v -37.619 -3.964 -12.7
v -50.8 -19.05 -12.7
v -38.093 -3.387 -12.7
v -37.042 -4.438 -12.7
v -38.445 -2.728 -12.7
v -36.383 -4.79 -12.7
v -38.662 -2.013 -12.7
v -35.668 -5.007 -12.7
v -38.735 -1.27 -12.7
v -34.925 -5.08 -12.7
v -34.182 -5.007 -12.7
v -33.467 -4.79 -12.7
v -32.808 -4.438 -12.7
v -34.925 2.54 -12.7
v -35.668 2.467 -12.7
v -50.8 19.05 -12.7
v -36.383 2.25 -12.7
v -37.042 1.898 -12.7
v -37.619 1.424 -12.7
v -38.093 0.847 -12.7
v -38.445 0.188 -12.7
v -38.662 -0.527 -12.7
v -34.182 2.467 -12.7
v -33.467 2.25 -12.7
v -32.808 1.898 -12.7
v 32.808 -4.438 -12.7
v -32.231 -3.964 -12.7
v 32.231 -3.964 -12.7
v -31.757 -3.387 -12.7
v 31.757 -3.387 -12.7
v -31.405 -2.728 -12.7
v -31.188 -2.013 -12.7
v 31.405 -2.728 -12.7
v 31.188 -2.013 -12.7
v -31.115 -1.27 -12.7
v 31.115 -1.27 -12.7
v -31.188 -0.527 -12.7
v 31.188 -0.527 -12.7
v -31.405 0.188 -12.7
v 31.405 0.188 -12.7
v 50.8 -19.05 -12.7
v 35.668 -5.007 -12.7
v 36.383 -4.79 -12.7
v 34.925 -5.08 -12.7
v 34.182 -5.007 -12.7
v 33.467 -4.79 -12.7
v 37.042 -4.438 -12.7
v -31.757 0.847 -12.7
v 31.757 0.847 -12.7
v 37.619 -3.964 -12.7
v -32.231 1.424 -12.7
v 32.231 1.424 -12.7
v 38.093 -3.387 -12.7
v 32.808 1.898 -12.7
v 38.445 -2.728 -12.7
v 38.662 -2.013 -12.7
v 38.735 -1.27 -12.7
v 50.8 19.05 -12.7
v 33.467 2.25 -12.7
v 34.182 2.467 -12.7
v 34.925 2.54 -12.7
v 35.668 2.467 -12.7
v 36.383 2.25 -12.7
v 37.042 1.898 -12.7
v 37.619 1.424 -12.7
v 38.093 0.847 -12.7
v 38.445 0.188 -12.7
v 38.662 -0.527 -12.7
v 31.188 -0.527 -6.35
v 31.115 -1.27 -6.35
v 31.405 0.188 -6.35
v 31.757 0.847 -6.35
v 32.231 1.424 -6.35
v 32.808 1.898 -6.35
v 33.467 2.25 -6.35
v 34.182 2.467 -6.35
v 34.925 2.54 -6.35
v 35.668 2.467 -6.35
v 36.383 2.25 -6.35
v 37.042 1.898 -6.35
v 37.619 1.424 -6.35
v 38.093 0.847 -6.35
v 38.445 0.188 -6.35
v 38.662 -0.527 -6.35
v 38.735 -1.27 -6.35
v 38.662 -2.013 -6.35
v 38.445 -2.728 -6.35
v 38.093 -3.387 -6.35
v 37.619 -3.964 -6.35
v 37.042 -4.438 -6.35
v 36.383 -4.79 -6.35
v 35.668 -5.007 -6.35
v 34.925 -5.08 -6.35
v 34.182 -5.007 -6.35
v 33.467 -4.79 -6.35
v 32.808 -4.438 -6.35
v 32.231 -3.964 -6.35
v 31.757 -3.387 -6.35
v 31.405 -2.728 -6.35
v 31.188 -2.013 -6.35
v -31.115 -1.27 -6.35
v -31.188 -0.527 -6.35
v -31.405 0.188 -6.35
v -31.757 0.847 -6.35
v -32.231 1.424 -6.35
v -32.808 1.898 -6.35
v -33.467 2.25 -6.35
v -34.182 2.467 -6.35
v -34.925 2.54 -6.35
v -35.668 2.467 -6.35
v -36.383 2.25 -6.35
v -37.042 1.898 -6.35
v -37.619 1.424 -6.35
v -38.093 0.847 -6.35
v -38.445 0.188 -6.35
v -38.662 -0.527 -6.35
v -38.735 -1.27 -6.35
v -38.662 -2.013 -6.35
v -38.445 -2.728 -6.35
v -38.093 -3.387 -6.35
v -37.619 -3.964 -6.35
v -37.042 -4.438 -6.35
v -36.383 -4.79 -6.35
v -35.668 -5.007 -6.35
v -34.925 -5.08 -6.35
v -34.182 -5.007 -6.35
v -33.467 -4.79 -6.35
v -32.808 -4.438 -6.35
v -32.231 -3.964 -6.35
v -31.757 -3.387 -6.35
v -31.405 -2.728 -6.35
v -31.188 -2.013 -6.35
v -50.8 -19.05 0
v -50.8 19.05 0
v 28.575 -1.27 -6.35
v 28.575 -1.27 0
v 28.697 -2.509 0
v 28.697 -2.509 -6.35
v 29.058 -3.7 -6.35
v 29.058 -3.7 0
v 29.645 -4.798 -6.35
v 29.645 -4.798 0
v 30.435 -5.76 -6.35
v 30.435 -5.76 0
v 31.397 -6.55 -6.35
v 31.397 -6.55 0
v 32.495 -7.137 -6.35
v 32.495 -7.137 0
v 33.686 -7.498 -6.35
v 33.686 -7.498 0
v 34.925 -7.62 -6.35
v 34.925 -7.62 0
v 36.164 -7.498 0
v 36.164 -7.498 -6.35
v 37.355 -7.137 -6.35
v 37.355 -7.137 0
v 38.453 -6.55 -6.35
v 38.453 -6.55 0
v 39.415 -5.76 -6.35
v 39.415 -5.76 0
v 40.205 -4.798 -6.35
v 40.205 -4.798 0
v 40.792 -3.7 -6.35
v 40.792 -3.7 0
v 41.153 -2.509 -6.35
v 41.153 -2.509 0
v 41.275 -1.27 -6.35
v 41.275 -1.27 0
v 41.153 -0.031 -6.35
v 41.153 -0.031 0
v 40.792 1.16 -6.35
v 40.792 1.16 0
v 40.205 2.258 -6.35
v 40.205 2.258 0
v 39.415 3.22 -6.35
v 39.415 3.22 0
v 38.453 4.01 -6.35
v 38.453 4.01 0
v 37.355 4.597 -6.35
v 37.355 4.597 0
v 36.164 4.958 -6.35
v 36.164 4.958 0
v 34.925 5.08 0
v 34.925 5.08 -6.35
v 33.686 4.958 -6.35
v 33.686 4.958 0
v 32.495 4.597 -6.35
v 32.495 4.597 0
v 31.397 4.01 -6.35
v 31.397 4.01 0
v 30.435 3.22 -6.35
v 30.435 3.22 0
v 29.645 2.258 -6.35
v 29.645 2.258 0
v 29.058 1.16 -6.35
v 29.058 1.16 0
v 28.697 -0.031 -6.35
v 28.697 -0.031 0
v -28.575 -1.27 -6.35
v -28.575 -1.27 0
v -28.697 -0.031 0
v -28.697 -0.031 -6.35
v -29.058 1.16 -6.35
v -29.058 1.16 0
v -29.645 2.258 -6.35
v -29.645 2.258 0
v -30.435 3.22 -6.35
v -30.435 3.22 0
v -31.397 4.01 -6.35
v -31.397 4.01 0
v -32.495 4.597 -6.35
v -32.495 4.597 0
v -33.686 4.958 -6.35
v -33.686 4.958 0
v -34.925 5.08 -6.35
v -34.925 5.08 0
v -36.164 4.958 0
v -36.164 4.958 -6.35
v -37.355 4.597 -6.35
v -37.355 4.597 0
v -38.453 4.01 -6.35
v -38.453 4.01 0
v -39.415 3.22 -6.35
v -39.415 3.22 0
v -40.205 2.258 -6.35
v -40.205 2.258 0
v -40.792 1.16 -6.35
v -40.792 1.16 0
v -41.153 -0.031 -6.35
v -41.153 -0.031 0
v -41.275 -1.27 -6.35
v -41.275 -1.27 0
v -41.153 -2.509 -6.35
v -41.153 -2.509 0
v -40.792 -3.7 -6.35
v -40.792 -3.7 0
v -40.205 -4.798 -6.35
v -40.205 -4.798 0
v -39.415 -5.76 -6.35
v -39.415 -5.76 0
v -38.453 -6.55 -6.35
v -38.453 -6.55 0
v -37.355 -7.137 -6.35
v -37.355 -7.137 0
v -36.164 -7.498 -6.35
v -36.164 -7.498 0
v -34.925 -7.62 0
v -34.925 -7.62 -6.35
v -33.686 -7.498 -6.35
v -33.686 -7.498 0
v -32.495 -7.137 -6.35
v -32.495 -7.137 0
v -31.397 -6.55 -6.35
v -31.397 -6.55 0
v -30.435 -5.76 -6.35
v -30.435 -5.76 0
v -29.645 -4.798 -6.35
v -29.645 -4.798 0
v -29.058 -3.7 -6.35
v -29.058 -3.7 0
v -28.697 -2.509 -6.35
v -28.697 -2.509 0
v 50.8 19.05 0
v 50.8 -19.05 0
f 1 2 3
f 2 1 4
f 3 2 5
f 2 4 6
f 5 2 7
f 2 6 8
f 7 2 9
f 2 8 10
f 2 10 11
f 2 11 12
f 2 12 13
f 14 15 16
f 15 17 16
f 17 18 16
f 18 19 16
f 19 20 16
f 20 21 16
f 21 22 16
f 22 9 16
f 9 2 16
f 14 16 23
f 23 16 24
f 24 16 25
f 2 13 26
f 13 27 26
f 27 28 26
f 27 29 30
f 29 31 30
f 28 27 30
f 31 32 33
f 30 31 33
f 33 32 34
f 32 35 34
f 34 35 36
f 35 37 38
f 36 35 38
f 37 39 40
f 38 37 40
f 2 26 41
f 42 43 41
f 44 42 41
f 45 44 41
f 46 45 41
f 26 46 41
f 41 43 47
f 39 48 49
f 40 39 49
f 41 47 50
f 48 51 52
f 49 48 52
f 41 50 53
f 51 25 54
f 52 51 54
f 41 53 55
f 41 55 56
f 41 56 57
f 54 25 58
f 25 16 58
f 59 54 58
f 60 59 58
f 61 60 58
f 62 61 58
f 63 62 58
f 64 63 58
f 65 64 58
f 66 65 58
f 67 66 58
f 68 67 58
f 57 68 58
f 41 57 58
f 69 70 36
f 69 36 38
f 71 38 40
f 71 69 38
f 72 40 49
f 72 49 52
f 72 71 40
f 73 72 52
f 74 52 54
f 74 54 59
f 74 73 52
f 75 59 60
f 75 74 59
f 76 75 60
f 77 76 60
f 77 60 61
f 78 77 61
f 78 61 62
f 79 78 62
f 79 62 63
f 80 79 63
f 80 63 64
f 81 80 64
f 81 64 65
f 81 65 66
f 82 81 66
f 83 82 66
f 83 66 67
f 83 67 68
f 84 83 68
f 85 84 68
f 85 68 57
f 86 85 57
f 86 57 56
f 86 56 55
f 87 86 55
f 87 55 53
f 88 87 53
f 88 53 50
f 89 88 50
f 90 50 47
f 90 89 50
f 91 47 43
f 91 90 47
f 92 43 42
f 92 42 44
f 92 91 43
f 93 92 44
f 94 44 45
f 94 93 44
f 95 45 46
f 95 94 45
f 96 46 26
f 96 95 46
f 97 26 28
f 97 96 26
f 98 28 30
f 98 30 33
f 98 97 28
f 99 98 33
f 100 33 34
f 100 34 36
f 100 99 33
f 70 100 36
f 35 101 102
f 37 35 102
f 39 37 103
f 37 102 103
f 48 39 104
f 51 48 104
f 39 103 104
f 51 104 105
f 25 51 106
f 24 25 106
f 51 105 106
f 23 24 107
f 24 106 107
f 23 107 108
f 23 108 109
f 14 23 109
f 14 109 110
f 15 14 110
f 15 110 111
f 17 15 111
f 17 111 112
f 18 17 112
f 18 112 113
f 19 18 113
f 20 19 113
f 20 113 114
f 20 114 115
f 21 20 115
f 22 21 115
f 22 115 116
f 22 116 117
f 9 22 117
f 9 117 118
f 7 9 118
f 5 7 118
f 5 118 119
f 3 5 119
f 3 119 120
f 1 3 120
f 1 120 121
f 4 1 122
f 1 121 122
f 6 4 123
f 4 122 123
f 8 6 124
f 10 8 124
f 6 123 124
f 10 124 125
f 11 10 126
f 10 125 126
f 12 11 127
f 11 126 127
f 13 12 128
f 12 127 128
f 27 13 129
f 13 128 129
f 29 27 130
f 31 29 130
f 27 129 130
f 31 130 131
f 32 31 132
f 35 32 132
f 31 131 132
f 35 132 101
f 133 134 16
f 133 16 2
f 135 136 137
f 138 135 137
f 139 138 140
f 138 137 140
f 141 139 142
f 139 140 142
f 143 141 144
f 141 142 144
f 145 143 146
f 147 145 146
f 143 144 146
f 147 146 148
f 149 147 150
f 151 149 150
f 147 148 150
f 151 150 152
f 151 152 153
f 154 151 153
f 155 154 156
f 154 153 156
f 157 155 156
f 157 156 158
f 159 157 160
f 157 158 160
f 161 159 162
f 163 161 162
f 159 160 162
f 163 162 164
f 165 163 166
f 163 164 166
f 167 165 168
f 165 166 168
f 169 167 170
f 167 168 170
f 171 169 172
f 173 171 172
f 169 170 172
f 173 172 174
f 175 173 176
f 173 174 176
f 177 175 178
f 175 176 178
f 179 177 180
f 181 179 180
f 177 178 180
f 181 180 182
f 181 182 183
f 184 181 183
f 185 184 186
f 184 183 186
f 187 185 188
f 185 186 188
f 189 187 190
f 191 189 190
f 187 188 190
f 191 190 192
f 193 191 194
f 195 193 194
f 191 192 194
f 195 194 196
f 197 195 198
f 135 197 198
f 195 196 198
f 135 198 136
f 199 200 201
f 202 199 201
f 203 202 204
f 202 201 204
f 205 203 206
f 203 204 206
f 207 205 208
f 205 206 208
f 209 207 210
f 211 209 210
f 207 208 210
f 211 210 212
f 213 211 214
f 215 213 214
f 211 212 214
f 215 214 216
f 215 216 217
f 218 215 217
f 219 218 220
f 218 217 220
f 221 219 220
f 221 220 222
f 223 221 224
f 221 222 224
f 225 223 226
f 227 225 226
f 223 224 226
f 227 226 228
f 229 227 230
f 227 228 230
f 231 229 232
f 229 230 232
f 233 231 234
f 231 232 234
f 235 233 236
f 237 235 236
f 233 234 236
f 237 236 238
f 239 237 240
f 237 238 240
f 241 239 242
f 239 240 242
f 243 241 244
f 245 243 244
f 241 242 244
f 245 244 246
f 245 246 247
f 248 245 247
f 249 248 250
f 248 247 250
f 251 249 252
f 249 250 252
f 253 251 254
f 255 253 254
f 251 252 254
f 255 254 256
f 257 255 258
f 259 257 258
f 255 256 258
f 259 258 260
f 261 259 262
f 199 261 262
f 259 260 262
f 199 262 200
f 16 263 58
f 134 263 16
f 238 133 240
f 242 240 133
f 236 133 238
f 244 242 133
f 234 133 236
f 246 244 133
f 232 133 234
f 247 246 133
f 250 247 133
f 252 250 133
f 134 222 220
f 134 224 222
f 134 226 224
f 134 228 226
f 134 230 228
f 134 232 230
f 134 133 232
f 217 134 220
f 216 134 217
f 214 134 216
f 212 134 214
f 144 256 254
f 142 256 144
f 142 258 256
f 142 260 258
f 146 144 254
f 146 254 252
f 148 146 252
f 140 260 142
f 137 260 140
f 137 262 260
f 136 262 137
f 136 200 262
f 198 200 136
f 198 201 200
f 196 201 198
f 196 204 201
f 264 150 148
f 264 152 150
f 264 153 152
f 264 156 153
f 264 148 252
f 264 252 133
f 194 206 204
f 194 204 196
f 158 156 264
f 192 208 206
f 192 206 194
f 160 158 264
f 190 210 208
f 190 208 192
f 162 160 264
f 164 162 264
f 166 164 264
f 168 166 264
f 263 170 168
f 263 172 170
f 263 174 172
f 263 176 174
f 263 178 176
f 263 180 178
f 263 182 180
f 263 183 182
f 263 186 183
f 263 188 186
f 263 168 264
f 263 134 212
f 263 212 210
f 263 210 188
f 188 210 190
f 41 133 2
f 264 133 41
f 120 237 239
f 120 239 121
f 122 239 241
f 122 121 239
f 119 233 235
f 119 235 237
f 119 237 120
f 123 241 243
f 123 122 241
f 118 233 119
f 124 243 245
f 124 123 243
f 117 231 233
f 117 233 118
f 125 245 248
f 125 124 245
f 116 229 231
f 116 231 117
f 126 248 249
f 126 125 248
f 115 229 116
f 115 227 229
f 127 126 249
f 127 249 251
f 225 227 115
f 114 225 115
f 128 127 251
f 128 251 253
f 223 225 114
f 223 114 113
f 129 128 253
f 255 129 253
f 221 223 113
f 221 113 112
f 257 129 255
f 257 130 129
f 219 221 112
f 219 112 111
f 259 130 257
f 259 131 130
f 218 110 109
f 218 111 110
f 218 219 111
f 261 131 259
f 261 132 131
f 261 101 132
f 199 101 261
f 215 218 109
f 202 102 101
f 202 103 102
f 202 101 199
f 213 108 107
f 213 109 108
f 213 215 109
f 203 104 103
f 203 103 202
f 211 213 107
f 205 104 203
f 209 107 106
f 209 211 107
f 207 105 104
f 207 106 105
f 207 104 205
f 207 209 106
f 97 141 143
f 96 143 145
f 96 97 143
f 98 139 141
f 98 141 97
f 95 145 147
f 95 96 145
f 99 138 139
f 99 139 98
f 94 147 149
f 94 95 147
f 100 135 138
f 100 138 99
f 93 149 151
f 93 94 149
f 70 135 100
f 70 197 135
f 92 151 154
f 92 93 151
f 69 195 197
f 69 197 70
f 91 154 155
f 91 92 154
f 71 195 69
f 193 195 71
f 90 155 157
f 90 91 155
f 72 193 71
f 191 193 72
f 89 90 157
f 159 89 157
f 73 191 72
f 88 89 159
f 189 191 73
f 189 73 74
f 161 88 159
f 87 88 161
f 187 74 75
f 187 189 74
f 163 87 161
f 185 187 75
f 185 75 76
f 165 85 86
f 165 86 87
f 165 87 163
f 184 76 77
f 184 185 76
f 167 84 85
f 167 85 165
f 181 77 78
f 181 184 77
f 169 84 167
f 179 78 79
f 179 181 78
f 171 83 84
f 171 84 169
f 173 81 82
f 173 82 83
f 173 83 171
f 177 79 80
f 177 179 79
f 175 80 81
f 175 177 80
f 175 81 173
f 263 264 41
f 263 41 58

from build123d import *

# Parameters (mm, degrees)
F0_R     = 3.81
F0_R_2   = 6.35
F1_DEPTH = 12.7
F2_DEPTH = 6.35


with BuildPart() as f1:
    # F0 (on Top) → F1 (new body)
    with BuildSketch(Plane.XY):
        with BuildLine():
            ThreePointArc((38.735, -1.27), (34.925, 2.54), (31.115, -1.27))
            ThreePointArc((31.115, -1.27), (34.925, -5.08), (38.735, -1.27))
        make_face()
        with Locations((-34.925, -1.27)):
            Circle(F0_R)
        Polygon((-50.8, -19.05), (50.8, -19.05), (50.8, 19.05), (0, 19.05), (-50.8, 19.05), align=None)
        with Locations((-34.925, -1.27)):
            Circle(F0_R_2, mode=Mode.SUBTRACT)
        with BuildLine():
            ThreePointArc((41.275, -1.27), (34.925, -7.62), (28.575, -1.27))
            ThreePointArc((28.575, -1.27), (34.925, 5.08), (41.275, -1.27))
        make_face(mode=Mode.SUBTRACT)
        with BuildLine():
            ThreePointArc((41.275, -1.27), (34.925, 5.08), (28.575, -1.27))
            ThreePointArc((28.575, -1.27), (34.925, -7.62), (41.275, -1.27))
        make_face()
        with BuildLine():
            ThreePointArc((38.735, -1.27), (34.925, -5.08), (31.115, -1.27))
            ThreePointArc((31.115, -1.27), (34.925, 2.54), (38.735, -1.27))
        make_face(mode=Mode.SUBTRACT)
        with Locations((-34.925, -1.27)):
            Circle(F0_R_2)
        with Locations((-34.925, -1.27)):
            Circle(F0_R, mode=Mode.SUBTRACT)
    extrude(amount=-F1_DEPTH)

    # F0 (on Top) → F2 (cut)
    with BuildSketch(Plane.XY):
        with Locations((-34.925, -1.27)):
            Circle(F0_R_2)
        with Locations((-34.925, -1.27)):
            Circle(F0_R, mode=Mode.SUBTRACT)
        with BuildLine():
            ThreePointArc((41.275, -1.27), (34.925, 5.08), (28.575, -1.27))
            ThreePointArc((28.575, -1.27), (34.925, -7.62), (41.275, -1.27))
        make_face()
        with BuildLine():
            ThreePointArc((38.735, -1.27), (34.925, -5.08), (31.115, -1.27))
            ThreePointArc((31.115, -1.27), (34.925, 2.54), (38.735, -1.27))
        make_face(mode=Mode.SUBTRACT)
    extrude(amount=-F2_DEPTH, mode=Mode.SUBTRACT)


solid = f1.part
